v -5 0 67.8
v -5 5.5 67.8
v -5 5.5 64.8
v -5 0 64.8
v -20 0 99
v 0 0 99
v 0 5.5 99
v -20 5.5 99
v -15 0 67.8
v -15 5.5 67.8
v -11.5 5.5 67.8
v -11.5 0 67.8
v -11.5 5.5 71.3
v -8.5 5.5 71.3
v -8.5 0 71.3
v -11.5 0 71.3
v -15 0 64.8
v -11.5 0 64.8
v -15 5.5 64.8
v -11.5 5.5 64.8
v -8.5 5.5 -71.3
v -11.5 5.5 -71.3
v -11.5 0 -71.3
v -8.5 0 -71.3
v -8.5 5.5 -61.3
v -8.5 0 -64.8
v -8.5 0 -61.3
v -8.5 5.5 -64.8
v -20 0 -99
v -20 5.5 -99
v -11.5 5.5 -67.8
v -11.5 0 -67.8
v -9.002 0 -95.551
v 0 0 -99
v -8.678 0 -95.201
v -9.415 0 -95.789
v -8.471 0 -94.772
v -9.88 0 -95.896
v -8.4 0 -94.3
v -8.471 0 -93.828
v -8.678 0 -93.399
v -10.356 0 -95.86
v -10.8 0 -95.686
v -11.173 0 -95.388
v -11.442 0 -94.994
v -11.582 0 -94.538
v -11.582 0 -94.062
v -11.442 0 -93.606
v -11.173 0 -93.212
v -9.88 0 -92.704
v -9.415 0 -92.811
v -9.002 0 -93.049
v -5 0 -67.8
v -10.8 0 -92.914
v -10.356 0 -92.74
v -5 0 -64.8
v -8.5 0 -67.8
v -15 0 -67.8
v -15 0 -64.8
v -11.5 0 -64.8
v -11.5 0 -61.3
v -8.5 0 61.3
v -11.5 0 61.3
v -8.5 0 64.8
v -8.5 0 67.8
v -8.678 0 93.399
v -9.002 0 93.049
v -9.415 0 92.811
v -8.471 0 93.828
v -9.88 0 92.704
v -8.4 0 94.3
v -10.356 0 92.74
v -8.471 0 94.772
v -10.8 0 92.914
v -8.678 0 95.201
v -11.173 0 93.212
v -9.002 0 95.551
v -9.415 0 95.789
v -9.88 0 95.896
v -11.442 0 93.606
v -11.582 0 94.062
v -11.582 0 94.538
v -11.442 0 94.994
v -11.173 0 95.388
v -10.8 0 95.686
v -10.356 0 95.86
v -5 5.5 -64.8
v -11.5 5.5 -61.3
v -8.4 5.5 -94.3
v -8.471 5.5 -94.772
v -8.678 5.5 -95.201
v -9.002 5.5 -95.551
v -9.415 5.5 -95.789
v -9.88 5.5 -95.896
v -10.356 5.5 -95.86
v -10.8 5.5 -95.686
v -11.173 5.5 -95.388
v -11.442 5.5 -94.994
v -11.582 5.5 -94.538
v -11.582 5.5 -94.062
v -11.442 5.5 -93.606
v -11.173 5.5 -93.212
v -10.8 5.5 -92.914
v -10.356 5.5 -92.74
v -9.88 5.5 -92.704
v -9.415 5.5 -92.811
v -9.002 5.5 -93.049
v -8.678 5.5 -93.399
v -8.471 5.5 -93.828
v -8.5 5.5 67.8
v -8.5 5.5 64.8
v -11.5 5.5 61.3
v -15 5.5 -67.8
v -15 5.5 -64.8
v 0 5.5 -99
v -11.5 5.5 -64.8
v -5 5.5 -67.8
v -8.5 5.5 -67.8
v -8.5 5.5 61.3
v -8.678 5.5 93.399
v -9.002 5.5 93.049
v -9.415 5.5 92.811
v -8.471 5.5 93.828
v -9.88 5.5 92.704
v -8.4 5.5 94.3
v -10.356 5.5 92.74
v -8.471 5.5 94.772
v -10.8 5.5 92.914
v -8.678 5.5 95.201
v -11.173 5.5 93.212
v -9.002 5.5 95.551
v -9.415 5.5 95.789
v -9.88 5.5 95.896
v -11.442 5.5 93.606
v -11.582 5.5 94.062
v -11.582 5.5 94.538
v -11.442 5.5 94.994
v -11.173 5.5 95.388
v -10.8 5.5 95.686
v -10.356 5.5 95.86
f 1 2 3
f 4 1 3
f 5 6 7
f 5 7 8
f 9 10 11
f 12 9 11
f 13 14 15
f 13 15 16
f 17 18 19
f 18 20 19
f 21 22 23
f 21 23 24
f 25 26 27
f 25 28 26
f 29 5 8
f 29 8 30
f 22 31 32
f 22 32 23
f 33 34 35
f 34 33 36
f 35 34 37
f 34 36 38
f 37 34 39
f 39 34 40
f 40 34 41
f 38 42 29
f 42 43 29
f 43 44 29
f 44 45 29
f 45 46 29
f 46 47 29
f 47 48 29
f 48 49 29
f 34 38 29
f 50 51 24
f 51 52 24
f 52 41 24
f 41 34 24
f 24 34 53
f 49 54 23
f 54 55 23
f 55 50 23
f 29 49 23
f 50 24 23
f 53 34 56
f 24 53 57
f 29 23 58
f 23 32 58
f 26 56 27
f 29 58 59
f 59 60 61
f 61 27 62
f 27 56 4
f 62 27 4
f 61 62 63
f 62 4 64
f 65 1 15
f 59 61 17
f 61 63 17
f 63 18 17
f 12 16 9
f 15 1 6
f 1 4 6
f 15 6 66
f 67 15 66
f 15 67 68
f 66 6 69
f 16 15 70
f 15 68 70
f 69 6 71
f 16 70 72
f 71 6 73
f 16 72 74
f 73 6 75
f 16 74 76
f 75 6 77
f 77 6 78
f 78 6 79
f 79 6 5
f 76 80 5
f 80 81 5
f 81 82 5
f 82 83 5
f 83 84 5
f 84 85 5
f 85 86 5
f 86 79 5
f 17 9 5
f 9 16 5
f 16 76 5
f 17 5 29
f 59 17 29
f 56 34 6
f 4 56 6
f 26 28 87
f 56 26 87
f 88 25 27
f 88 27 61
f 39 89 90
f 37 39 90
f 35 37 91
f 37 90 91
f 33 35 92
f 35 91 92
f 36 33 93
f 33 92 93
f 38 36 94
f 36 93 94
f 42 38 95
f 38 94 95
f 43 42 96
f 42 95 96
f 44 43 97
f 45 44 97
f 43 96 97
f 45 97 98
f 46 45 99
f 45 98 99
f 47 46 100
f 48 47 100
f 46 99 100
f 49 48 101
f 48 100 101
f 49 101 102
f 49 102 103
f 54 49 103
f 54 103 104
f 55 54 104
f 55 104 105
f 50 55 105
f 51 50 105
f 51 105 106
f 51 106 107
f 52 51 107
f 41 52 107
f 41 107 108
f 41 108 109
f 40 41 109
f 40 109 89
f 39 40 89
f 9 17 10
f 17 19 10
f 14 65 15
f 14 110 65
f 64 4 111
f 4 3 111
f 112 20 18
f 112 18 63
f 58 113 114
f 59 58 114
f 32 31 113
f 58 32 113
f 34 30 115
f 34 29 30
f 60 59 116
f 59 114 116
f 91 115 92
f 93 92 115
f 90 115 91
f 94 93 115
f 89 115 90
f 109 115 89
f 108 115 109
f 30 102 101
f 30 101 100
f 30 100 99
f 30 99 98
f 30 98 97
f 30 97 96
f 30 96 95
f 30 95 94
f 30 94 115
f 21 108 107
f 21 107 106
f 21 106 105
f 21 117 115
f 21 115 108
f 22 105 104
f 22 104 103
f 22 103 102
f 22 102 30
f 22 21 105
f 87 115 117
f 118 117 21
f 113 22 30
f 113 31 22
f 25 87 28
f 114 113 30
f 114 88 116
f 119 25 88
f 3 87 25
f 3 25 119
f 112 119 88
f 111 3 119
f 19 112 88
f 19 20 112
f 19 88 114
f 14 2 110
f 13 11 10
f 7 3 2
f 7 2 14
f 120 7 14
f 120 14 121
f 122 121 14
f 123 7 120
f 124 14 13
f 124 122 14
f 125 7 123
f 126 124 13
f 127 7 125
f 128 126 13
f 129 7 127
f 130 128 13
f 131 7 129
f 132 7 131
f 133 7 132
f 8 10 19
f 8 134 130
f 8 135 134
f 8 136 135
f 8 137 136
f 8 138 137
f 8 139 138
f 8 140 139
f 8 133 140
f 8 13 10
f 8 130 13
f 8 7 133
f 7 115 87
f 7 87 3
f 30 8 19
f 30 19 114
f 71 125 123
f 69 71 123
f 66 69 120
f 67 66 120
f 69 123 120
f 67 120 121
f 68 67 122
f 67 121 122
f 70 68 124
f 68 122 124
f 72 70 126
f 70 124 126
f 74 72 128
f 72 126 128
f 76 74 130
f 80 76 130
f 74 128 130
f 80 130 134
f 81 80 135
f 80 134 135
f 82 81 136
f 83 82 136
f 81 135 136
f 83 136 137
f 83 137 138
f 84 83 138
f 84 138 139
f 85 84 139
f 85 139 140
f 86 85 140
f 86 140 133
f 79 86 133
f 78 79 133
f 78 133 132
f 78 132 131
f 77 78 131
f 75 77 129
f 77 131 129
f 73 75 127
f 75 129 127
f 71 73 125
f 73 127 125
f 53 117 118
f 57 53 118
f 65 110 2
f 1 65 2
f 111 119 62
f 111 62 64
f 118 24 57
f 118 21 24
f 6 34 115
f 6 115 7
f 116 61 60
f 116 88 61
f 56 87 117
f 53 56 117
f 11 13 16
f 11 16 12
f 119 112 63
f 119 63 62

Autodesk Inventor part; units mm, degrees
ref_plane "YZ Plane" through (0, 0, 0) normal (1, 0, 0) x (0, 1, 0)
ref_plane "XZ Plane" through (0, 0, 0) normal (0, 1, 0) x (-1, 0, 0)
ref_plane "XY Plane" through (0, 0, 0) normal (0, 0, 1) x (1, 0, 0)
sketch "スケッチ1" plane through (0, 0, 0) normal (0, 1, 0) x (-1, 0, 0)
  line L0 (0, 99) -> (20, 99)
  line L1 (20, 99) -> (20, -99)
  line L2 (20, -99) -> (0, -99)
  line L3 (0, -99) -> (0, 99)
  point P0 (0, 0)
  point P1 (0, 0)
  dimension "d0" = 198
  dimension "d1" = 20
extrude "押し出し1" add sketch "スケッチ1" along normal blind 5.5
sketch "スケッチ2" plane through (0, 5.5, 0) normal (0, 1, 0) x (1, 0, 0)
  line L0 (-15, -67.8) -> (-5, -67.8)
  line L1 (-5, -67.8) -> (-5, -64.8)
  line L2 (-5, -64.8) -> (-15, -64.8)
  line L3 (-15, -64.8) -> (-15, -67.8)
  line L4 (-8.5, -71.3) -> (-11.5, -71.3)
  line L5 (-11.5, -71.3) -> (-11.5, -61.3)
  line L6 (-11.5, -61.3) -> (-8.5, -61.3)
  line L7 (-8.5, -61.3) -> (-8.5, -71.3)
  line L8 (-20, -99) -> (0, -99) projected
  circle A0 centre (-10, -94.3) radius 1.6
  point P0 (0, 0)
  point P1 (-8.5, -66.3)
  point P2 (-15, -66.3)
  point P3 (-10, -71.3)
  point P4 (-10, -67.8)
  point P5 (-10, -99)
  point P6 (-8.5, -64.8)
  point P7 (-11.5, -64.8)
  point P8 (-11.5, -67.8)
  point P9 (-8.5, -67.8)
  point P10 (-10, -99)
  dimension "d4" = 10
  dimension "d5" = 27.7
  dimension "d6" = 3
  dimension "d9" = 3.2
  dimension "d10" = 4.7
extrude "押し出し2" cut sketch "スケッチ2" against normal through all
mirror "ミラー1" about plane through (0, 0, 0) normal (0, 0, 1) of "押し出し2"
properties part number "front_connector_base" material "木材 (カエデ材)"
